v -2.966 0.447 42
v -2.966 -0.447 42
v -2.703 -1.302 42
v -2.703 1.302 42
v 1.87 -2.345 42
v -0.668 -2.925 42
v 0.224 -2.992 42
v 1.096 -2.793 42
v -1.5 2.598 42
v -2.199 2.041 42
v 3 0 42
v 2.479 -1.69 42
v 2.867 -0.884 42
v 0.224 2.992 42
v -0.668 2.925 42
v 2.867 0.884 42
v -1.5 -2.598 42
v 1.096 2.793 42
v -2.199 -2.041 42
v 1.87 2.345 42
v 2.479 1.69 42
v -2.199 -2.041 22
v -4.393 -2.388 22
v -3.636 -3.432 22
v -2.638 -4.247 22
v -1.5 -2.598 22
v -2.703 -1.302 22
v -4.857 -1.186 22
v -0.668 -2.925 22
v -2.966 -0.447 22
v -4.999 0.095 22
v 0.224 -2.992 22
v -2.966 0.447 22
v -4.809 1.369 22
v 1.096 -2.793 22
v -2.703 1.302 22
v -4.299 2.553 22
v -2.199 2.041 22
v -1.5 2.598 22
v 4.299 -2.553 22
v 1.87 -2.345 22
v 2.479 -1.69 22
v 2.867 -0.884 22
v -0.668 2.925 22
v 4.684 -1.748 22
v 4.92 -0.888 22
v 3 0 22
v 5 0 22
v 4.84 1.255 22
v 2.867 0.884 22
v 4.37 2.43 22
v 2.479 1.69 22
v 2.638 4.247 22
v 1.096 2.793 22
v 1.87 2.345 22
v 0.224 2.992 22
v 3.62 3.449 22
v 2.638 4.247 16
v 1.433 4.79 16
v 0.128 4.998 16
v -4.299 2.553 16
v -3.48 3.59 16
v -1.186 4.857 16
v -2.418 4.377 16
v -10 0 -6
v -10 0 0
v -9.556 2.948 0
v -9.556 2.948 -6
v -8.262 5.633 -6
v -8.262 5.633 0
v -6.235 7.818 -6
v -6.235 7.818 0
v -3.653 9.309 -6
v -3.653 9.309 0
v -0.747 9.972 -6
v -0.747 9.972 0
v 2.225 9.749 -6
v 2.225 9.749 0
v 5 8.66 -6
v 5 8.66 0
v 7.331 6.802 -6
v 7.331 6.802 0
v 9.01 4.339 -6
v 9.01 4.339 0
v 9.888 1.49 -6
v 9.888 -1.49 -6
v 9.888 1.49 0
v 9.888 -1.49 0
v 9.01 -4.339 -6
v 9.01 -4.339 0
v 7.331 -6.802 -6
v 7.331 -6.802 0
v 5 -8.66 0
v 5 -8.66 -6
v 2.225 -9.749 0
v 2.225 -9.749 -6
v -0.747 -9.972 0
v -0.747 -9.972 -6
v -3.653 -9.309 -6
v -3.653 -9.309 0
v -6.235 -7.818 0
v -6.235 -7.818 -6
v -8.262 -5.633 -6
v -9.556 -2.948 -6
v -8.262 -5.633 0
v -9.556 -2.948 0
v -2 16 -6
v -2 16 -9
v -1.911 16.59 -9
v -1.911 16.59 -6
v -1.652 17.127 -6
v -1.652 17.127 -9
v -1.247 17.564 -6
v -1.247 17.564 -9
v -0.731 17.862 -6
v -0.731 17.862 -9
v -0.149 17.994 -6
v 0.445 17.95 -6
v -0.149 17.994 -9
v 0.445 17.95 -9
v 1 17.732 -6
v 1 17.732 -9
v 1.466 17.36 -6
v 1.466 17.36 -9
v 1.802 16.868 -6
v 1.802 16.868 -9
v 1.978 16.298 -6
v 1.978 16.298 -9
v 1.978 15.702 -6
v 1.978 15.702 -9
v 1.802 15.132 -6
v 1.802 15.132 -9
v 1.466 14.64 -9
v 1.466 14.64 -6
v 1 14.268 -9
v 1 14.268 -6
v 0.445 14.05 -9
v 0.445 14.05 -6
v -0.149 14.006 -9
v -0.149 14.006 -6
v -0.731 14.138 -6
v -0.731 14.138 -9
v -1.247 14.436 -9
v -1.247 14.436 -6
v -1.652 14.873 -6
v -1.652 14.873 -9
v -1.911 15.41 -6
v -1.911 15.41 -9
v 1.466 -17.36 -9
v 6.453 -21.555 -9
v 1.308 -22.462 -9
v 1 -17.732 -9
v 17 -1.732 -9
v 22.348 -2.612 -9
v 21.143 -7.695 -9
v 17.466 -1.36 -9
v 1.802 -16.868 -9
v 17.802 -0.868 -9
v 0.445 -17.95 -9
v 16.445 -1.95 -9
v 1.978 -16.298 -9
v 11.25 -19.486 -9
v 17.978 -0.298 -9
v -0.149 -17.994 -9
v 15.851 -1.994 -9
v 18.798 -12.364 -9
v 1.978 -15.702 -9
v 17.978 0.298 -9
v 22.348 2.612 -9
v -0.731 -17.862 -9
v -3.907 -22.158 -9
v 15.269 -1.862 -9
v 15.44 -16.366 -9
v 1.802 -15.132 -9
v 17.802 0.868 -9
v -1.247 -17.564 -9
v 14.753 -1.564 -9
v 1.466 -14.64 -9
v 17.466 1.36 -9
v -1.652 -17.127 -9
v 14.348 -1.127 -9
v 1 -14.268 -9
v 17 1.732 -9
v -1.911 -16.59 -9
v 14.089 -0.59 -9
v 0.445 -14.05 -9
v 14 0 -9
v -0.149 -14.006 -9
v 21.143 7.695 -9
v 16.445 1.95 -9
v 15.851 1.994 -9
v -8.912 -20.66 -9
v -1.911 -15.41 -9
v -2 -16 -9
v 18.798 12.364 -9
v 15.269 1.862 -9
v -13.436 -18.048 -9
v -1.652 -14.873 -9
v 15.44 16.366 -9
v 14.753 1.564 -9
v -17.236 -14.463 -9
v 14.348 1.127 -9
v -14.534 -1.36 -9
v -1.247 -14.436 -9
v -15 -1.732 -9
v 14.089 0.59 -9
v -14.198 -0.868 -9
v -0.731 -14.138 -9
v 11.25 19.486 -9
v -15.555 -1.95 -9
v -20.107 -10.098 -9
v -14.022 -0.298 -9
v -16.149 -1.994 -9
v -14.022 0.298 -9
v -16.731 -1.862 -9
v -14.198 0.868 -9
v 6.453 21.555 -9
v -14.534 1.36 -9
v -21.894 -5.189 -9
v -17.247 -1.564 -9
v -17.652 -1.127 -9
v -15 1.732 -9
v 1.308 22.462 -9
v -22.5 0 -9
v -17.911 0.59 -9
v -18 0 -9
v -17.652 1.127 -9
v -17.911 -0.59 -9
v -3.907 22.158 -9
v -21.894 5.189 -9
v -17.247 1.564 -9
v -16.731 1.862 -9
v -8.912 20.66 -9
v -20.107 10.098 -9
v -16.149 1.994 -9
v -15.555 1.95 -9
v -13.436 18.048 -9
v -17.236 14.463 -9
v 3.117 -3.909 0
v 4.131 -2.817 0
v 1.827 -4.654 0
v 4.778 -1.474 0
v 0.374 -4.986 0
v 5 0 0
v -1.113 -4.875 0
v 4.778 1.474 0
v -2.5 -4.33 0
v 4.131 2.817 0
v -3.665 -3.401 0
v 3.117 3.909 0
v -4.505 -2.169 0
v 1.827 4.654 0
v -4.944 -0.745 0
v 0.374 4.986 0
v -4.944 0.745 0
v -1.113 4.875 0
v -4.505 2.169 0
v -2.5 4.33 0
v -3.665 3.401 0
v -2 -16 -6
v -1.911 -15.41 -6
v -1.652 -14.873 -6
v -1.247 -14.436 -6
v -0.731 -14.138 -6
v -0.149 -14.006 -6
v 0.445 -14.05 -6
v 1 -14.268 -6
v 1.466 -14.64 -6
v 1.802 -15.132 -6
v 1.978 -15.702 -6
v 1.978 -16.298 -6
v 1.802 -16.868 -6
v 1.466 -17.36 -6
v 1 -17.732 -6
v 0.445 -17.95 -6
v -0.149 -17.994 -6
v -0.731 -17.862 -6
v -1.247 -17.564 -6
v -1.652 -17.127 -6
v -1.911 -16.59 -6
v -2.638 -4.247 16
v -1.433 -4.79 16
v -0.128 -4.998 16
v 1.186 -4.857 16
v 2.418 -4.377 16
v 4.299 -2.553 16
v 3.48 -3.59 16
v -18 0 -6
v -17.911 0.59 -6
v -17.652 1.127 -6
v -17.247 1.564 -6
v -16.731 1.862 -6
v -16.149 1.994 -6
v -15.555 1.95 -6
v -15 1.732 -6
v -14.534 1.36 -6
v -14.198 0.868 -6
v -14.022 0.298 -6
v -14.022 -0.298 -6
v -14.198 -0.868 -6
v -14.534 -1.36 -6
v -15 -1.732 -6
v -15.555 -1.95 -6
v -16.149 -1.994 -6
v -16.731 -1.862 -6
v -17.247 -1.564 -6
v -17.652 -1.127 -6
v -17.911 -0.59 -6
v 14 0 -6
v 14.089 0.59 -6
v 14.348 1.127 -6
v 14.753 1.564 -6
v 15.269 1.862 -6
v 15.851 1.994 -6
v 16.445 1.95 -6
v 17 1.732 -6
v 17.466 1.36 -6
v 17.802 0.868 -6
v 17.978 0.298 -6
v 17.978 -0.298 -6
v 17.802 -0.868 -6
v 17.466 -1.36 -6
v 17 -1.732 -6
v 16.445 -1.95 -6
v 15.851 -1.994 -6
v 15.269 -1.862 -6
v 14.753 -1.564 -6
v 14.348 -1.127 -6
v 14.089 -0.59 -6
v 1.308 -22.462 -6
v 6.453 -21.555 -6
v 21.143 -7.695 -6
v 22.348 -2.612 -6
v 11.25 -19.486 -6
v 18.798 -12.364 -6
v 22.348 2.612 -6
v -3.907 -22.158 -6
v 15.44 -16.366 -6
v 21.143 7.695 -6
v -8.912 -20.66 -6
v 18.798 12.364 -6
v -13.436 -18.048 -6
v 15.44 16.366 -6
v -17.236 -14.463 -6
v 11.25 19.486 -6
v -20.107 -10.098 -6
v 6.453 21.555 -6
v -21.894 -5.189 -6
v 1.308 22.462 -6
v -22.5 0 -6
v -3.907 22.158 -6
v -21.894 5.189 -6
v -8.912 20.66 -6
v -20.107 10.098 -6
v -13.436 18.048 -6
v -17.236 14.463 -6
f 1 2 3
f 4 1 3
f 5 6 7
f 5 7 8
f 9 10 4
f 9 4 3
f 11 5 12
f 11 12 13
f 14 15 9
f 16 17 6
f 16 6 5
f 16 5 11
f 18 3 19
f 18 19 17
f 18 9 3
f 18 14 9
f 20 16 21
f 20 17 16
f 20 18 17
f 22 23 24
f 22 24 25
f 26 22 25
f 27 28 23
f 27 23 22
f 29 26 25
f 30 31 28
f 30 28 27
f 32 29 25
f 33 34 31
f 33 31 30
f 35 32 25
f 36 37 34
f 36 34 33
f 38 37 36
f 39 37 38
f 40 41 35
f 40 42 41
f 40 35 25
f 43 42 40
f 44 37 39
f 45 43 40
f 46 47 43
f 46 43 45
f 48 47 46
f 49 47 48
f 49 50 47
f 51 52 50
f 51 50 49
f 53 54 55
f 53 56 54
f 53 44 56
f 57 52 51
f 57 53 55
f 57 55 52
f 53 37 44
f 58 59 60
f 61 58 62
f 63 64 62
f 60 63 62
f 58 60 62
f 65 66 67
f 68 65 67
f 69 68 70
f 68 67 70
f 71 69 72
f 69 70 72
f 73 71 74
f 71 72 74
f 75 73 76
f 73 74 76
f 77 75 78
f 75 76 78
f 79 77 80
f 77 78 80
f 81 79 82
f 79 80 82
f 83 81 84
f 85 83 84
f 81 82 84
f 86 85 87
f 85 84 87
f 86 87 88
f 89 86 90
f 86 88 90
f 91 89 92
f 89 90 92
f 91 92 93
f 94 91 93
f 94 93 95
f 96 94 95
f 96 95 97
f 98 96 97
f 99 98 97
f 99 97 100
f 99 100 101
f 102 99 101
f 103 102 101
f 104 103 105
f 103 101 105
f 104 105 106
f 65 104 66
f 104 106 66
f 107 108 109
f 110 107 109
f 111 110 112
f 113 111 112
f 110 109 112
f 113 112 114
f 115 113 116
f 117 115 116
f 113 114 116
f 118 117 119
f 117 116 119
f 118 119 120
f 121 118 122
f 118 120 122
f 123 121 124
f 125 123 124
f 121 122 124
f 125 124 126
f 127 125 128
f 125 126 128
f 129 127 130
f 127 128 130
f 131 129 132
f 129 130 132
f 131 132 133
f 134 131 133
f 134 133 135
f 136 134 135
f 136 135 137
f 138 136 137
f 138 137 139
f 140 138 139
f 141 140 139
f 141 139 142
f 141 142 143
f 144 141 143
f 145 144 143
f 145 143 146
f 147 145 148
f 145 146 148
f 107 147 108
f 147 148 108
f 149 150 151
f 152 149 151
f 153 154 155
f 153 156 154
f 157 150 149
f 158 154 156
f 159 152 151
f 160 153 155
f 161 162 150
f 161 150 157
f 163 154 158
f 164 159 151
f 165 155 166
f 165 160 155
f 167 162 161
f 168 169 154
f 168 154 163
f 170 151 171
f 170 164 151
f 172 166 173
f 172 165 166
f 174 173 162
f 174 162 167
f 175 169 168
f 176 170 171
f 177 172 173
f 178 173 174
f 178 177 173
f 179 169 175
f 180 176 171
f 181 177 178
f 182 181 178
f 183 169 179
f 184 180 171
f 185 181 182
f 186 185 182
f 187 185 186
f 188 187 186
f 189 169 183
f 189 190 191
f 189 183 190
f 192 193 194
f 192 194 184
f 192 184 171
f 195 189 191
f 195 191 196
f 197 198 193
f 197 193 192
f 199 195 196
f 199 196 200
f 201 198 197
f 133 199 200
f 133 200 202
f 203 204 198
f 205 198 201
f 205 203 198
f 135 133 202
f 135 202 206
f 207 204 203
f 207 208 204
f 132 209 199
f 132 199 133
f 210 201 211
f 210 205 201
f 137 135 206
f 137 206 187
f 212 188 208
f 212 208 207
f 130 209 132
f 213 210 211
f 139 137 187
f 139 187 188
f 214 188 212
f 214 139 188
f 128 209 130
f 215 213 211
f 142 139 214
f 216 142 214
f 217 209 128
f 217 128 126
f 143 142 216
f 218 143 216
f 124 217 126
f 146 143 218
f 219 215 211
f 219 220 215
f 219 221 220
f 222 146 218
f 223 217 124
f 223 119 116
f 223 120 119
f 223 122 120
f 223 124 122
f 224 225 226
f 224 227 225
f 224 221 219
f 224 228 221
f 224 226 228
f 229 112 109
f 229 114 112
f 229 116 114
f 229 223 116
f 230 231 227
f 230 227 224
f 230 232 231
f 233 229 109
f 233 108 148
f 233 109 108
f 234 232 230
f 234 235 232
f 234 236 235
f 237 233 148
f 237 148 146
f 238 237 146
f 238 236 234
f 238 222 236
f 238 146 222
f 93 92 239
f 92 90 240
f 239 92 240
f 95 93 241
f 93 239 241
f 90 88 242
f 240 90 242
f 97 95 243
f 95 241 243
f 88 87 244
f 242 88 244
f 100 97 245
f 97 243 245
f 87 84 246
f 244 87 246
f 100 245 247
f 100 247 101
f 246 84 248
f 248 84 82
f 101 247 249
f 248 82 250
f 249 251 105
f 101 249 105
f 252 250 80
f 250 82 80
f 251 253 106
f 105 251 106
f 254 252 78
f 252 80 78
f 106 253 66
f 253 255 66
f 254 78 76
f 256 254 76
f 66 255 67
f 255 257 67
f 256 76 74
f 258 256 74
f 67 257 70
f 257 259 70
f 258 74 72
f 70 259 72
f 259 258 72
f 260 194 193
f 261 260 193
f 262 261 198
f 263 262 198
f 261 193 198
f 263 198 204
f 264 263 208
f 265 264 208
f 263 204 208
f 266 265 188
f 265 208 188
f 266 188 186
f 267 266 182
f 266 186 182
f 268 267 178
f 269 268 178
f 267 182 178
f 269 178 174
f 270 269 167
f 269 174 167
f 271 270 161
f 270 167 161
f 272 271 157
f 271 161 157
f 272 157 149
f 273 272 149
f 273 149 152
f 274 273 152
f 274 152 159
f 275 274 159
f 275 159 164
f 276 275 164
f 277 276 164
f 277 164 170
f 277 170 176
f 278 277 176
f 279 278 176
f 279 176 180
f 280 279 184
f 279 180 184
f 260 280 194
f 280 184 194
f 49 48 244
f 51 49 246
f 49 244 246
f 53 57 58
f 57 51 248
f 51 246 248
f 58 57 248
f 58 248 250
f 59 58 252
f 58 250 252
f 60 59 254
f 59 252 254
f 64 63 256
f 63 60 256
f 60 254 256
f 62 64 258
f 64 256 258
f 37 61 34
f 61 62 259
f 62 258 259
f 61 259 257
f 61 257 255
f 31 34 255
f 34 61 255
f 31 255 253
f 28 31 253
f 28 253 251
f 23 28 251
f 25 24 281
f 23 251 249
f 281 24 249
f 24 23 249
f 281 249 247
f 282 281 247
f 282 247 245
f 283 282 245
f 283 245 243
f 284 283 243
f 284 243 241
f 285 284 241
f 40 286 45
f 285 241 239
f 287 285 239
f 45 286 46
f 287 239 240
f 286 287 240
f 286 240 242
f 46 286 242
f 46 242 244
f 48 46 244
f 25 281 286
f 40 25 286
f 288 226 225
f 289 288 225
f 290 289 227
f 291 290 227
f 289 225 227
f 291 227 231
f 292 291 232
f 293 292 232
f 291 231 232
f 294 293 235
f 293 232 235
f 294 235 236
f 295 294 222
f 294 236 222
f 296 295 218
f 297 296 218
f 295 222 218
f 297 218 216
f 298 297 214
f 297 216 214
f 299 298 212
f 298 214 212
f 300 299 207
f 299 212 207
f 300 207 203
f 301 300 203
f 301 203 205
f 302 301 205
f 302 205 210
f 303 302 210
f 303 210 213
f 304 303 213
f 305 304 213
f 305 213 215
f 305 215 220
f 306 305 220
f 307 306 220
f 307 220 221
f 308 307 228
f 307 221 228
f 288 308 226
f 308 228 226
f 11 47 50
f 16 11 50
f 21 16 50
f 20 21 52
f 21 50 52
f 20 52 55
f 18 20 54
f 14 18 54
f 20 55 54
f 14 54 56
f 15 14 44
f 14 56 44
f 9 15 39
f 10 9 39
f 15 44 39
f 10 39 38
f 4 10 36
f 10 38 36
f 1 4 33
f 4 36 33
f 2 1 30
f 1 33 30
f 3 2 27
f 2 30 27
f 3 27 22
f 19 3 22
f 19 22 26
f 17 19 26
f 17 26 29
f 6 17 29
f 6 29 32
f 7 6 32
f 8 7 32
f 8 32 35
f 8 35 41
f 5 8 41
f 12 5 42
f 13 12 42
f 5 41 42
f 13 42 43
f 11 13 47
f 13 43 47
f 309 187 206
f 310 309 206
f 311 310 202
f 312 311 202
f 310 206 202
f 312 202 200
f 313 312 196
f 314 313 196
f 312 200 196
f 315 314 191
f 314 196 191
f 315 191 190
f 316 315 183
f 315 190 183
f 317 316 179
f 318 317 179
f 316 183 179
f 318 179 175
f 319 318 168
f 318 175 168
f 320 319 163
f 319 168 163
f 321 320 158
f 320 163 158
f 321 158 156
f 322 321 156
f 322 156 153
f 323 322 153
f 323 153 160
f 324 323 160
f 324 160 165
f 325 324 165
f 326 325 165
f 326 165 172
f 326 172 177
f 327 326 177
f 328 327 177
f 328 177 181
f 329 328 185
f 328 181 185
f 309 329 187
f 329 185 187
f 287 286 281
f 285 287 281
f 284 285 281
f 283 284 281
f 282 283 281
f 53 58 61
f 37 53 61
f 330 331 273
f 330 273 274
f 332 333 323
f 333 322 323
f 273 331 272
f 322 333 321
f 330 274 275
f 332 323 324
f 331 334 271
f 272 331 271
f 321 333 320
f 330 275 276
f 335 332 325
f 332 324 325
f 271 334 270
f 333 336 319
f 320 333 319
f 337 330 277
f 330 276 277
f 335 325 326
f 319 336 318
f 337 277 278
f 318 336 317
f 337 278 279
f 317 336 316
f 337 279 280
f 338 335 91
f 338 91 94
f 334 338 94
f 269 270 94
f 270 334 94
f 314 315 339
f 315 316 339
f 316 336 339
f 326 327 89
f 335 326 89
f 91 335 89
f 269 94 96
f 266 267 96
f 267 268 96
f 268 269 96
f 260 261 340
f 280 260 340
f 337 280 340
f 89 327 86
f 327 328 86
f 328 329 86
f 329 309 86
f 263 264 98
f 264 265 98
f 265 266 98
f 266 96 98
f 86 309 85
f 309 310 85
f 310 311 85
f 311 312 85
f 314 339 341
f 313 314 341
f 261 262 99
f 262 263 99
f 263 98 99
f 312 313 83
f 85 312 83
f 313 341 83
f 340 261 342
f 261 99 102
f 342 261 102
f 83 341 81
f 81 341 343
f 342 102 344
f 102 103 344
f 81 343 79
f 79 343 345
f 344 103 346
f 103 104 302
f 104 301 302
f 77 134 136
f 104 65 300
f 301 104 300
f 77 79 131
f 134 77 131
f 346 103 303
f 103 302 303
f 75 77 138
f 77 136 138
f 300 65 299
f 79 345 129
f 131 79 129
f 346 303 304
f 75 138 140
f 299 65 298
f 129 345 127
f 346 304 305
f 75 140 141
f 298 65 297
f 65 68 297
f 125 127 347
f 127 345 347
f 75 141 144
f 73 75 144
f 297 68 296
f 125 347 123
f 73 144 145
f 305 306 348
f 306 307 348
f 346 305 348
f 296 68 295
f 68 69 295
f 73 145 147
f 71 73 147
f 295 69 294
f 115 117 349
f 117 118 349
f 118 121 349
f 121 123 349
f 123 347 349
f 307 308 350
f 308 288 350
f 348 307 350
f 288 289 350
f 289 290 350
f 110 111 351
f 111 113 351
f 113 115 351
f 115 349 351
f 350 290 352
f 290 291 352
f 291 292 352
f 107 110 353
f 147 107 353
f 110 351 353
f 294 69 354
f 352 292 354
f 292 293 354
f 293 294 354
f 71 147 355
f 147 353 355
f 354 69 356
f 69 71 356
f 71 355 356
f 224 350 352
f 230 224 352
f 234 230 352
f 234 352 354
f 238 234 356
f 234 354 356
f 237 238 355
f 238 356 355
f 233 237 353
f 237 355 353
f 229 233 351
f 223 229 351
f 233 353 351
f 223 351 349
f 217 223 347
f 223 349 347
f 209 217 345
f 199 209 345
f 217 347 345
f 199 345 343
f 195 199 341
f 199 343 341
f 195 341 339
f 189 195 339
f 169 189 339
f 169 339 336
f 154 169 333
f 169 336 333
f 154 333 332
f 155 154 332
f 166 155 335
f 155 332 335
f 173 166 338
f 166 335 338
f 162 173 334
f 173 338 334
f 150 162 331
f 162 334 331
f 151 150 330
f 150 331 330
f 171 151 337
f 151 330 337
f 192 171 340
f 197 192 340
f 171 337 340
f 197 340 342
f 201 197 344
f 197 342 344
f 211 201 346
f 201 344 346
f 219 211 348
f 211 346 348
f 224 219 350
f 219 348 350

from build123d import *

# Parameters (mm, degrees)
SKETCH1_R           = 5
BOSS_EXTRUDE1_DEPTH = 22
CUT_EXTRUDE1_START  = -6
CUT_EXTRUDE1_DEPTH  = 6
SKETCH3_R           = 3
BOSS_EXTRUDE2_DEPTH = 20
SKETCH4_R           = 10
BOSS_EXTRUDE3_DEPTH = 6
SKETCH5_R           = 22.5
BOSS_EXTRUDE4_DEPTH = 3
SKETCH6_R           = 2
CUT_EXTRUDE2_DEPTH  = 3


with BuildPart() as part:
    # Sketch1 → Boss-Extrude1 (new body)
    with BuildSketch(Plane.XY):
        Circle(SKETCH1_R)
    extrude(amount=BOSS_EXTRUDE1_DEPTH)

    # Sketch2 → Cut-Extrude1 (cut)
    with BuildSketch(Plane.XY.offset(22).offset(CUT_EXTRUDE1_START)):
        with BuildLine():
            Line((2.638277831, 4.247292089), (-4.299208102, 2.552804281))
            ThreePointArc((-4.299208102, 2.552804281), (-1.186378765, 4.857211693), (2.638277831, 4.247292089))
        make_face()
        with BuildLine():
            Line((-2.638277831, -4.247292089), (4.299208102, -2.552804281))
            ThreePointArc((4.299208102, -2.552804281), (1.186378765, -4.857211693), (-2.638277831, -4.247292089))
        make_face()
    extrude(amount=CUT_EXTRUDE1_DEPTH, mode=Mode.SUBTRACT)

    # Sketch3 → Boss-Extrude2 (add)
    with BuildSketch(Plane.XY.offset(22)):
        Circle(SKETCH3_R)
    extrude(amount=BOSS_EXTRUDE2_DEPTH)

    # Sketch4 → Boss-Extrude3 (add)
    with BuildSketch(Plane(origin=(0, 0, 0), x_dir=(-1, 0, 0), z_dir=(0, 0, -1))):
        Circle(SKETCH4_R)
    extrude(amount=BOSS_EXTRUDE3_DEPTH)

    # Sketch5 → Boss-Extrude4 (add)
    with BuildSketch(Plane(origin=(0, 0, -6), x_dir=(-1, 0, 0), z_dir=(0, 0, -1))):
        Circle(SKETCH5_R)
    extrude(amount=BOSS_EXTRUDE4_DEPTH)

    # Sketch6 → Cut-Extrude2 (cut)
    with BuildSketch(Plane(origin=(0, 0, -9), x_dir=(-1, 0, 0), z_dir=(0, 0, -1))):
        with Locations((-16, 0)):
            Circle(SKETCH6_R)
        with Locations((0, 16)):
            Circle(SKETCH6_R)
        with Locations((16, 0)):
            Circle(SKETCH6_R)
        with Locations((0, -16)):
            Circle(SKETCH6_R)
    extrude(amount=-CUT_EXTRUDE2_DEPTH, mode=Mode.SUBTRACT)


solid = part.part
